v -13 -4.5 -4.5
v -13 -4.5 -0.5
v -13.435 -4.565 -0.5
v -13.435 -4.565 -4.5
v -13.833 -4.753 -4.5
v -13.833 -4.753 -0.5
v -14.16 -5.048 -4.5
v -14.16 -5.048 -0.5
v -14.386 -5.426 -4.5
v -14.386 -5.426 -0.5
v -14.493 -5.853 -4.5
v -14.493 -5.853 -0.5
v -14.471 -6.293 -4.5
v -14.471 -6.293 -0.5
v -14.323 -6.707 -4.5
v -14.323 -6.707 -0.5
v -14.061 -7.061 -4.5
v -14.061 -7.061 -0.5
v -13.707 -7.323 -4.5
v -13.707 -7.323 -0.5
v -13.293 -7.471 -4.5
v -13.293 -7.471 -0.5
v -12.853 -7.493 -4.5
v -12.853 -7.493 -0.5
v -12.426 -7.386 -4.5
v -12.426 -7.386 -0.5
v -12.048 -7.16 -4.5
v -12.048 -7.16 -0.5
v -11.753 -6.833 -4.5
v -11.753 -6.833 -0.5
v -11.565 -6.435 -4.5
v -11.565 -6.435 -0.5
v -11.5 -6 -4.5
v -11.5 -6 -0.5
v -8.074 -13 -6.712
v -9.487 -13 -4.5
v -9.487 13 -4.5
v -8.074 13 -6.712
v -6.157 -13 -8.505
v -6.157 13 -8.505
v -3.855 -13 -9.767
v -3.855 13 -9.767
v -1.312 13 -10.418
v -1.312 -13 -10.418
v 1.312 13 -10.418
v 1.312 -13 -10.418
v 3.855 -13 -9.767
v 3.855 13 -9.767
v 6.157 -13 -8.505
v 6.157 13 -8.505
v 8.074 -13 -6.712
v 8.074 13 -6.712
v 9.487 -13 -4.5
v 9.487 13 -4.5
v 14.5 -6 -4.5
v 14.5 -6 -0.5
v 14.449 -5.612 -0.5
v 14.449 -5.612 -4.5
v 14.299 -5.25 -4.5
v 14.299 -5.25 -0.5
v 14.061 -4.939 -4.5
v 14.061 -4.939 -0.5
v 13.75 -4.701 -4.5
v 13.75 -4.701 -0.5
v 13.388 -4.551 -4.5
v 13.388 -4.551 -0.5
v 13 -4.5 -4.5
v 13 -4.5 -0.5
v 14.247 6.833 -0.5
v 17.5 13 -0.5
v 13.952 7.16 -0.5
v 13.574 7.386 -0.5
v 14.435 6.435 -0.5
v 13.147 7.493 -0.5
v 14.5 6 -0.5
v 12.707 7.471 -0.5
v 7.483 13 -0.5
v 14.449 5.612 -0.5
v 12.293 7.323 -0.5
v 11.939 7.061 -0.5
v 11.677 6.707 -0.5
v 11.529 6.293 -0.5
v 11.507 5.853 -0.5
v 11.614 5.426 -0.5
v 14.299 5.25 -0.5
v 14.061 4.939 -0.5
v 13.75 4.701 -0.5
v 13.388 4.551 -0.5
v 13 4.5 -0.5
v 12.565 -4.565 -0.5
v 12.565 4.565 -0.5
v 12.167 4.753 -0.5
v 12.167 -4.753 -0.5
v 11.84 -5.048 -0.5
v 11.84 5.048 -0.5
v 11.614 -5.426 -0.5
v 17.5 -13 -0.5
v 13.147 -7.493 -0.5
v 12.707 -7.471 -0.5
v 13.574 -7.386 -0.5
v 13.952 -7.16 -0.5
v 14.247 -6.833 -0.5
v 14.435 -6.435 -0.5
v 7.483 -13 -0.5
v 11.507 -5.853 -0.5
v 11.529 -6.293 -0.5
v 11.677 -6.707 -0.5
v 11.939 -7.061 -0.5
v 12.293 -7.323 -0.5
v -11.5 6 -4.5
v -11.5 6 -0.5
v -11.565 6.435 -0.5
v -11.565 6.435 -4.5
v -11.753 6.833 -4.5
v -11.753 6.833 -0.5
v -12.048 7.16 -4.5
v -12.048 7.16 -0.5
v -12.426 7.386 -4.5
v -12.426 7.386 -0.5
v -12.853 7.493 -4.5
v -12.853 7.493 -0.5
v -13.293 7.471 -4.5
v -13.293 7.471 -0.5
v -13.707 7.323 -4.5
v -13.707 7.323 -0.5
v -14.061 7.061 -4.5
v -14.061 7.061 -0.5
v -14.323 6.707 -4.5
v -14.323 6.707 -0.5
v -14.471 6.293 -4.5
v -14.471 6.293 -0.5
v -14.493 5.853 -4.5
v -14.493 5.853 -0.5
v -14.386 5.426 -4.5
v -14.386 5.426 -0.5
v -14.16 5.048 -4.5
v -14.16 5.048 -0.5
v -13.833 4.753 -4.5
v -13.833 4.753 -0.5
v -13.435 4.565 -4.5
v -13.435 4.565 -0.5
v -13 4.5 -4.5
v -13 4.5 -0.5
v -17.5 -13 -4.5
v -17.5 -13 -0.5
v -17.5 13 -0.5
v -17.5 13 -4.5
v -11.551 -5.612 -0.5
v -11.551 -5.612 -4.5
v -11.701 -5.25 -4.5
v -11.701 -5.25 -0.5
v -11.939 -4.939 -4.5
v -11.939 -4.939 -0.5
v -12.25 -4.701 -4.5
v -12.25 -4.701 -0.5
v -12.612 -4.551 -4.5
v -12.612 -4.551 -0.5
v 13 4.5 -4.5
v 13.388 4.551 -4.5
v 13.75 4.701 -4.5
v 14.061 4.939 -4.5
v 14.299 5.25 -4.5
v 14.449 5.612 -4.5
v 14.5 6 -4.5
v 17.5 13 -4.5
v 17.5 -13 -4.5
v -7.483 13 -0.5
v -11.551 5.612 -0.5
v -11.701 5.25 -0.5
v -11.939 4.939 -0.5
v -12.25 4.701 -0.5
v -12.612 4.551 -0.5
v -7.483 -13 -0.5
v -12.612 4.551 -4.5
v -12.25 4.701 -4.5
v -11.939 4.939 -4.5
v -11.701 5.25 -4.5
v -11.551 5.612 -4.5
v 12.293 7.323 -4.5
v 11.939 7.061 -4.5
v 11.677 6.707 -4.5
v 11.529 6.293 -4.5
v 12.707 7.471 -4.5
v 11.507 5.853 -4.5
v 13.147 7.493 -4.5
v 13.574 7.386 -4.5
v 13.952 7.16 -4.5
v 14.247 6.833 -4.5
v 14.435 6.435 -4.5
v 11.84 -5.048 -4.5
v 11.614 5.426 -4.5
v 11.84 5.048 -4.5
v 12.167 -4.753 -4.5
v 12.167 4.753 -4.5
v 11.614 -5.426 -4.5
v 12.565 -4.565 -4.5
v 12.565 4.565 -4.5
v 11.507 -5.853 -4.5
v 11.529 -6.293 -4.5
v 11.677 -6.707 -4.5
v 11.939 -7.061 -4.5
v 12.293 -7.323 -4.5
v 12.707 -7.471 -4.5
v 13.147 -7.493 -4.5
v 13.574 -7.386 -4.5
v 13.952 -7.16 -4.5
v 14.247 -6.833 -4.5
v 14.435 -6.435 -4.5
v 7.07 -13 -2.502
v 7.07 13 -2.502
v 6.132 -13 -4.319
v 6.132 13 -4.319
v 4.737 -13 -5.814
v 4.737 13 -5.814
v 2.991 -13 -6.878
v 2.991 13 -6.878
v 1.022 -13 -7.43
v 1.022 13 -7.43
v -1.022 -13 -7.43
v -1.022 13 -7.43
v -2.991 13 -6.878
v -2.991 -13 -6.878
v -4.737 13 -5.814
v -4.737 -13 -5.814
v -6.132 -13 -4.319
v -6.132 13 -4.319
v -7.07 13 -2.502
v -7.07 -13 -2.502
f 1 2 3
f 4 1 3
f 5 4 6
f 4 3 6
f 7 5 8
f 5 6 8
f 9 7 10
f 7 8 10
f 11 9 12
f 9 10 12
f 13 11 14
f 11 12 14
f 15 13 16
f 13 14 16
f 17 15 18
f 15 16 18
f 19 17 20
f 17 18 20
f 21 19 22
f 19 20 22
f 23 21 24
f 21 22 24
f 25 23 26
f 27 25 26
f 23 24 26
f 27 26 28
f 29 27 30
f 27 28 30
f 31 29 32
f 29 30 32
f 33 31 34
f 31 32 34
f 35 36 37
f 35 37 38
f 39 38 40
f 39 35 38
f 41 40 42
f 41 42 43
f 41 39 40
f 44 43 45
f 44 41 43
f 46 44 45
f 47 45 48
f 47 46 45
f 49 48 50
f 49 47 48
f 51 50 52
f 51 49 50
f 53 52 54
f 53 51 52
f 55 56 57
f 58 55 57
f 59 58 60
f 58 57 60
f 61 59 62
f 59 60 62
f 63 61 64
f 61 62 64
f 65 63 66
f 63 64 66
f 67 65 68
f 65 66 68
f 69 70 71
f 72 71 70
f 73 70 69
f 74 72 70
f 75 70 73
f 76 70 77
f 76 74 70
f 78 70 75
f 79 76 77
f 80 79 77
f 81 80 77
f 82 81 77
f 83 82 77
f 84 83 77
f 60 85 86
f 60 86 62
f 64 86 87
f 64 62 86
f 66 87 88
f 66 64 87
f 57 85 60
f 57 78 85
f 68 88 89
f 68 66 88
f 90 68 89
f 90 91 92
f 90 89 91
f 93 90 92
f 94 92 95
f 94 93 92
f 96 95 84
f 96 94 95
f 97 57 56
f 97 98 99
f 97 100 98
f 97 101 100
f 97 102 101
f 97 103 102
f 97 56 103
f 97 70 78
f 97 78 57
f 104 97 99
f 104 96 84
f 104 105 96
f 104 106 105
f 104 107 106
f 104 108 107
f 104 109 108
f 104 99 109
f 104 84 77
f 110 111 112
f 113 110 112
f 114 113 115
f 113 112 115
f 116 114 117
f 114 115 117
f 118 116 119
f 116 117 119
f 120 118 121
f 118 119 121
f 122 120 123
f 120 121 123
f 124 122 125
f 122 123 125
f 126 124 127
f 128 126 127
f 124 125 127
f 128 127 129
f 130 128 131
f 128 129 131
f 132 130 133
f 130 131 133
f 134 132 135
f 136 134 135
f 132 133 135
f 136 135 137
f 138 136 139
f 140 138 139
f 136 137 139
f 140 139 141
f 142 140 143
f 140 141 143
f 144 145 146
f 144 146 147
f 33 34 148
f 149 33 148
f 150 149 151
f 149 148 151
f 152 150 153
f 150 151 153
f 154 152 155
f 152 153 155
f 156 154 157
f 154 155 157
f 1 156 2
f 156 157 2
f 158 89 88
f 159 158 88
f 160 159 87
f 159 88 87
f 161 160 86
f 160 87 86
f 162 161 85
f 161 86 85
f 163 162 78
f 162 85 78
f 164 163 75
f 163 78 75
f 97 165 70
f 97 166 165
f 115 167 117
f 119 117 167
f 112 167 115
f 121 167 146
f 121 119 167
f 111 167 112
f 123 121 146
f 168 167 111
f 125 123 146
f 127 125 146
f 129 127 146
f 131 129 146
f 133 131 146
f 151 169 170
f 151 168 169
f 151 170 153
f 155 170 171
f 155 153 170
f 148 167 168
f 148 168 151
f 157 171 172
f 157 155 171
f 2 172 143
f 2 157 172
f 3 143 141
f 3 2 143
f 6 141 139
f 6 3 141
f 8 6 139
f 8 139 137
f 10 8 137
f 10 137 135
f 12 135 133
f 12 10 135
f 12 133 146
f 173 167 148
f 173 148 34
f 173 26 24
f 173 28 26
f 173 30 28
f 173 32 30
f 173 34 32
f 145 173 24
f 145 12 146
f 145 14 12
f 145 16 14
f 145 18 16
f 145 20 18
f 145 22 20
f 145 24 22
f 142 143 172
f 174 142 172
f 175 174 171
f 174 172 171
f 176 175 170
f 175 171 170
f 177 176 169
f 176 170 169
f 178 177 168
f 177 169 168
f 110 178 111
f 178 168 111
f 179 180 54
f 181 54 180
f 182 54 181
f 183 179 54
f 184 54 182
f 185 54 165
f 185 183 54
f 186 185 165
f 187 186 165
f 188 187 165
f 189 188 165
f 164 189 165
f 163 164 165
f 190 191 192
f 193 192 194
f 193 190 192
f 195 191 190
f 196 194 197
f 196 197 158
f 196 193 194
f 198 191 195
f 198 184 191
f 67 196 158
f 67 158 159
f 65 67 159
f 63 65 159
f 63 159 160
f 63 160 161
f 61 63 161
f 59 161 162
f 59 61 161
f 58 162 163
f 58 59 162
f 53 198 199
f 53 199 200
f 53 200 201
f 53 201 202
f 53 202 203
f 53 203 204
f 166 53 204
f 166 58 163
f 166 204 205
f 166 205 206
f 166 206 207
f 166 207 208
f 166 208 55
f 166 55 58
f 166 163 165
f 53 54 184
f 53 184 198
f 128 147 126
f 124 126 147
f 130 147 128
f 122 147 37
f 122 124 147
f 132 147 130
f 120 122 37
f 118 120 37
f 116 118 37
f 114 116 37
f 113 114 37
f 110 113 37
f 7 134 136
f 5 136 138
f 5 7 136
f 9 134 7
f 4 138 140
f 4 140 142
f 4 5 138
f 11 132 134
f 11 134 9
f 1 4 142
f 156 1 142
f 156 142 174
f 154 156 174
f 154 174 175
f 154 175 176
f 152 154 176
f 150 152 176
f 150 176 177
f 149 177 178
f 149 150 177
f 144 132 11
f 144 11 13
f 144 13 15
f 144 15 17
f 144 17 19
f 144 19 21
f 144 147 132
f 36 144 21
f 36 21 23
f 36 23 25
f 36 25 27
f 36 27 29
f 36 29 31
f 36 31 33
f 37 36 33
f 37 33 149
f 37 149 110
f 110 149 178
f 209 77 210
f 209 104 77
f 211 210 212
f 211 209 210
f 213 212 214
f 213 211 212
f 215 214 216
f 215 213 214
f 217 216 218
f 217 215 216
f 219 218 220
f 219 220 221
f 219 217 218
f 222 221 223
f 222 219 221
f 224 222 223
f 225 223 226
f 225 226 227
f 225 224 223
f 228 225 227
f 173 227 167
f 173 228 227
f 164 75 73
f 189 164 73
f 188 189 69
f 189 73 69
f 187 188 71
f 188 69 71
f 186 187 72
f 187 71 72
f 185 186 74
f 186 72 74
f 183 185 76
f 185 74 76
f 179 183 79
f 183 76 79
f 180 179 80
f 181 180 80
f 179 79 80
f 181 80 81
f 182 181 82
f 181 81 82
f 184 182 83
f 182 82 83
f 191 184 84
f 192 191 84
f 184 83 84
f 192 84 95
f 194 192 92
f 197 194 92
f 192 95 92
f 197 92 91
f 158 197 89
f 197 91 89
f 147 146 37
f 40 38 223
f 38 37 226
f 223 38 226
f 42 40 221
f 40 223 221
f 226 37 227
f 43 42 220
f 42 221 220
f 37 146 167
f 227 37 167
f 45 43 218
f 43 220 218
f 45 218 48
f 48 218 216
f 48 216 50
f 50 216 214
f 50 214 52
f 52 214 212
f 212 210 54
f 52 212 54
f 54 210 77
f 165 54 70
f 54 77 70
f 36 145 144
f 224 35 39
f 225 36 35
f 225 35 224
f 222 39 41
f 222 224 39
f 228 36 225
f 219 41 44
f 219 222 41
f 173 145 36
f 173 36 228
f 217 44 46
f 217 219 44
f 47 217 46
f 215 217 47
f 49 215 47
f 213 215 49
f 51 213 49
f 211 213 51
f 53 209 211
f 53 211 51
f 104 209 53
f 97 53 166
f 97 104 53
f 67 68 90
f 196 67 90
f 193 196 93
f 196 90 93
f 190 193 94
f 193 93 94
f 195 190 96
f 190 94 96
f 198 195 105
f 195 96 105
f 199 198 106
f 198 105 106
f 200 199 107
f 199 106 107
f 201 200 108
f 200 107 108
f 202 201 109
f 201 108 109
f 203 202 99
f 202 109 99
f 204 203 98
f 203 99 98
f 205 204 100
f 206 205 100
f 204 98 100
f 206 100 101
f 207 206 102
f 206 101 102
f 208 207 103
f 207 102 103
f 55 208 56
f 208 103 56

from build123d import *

# Parameters (mm, degrees)
F1_DEPTH = 13
F3_DEPTH = 10.501


with BuildPart() as f1:
    # F0 (on Front) → F1 (new body, symmetric)
    with BuildSketch(Plane.XZ):
        with BuildLine():
            ThreePointArc((7.483315, -0.5), (0, -7.5), (-7.483315, -0.5))
            Line((-7.483315, -0.5), (-10.488088, -0.5))
            Line((-10.488088, -0.5), (-17.5, -0.5))
            Line((-17.5, -0.5), (-17.5, -4.5))
            Line((-17.5, -4.5), (-9.486833, -4.5))
            ThreePointArc((-9.486833, -4.5), (0, -10.5), (9.486833, -4.5))
            Line((9.486833, -4.5), (17.5, -4.5))
            Line((17.5, -4.5), (17.5, -0.5))
            Line((17.5, -0.5), (10.488088, -0.5))
            Line((10.488088, -0.5), (7.483315, -0.5))
        make_face()
    extrude(amount=F1_DEPTH, both=True)

    # F2 (on Top) → F3 (cut, through all)
    with BuildSketch(Plane.XY):
        with BuildLine():
            ThreePointArc((14.5, 6), (11.93934, 7.06066), (13, 4.5))
            ThreePointArc((13, 4.5), (14.06066, 4.93934), (14.5, 6))
        make_face()
        with BuildLine():
            ThreePointArc((14.5, -6), (14.06066, -4.93934), (13, -4.5))
            ThreePointArc((13, -4.5), (11.93934, -7.06066), (14.5, -6))
        make_face()
        with BuildLine():
            ThreePointArc((-11.5, 6), (-14.06066, 7.06066), (-13, 4.5))
            ThreePointArc((-13, 4.5), (-11.93934, 4.93934), (-11.5, 6))
        make_face()
        with BuildLine():
            ThreePointArc((-11.5, -6), (-11.93934, -4.93934), (-13, -4.5))
            ThreePointArc((-13, -4.5), (-14.06066, -7.06066), (-11.5, -6))
        make_face()
    extrude(amount=-F3_DEPTH, mode=Mode.SUBTRACT)


solid = f1.part
